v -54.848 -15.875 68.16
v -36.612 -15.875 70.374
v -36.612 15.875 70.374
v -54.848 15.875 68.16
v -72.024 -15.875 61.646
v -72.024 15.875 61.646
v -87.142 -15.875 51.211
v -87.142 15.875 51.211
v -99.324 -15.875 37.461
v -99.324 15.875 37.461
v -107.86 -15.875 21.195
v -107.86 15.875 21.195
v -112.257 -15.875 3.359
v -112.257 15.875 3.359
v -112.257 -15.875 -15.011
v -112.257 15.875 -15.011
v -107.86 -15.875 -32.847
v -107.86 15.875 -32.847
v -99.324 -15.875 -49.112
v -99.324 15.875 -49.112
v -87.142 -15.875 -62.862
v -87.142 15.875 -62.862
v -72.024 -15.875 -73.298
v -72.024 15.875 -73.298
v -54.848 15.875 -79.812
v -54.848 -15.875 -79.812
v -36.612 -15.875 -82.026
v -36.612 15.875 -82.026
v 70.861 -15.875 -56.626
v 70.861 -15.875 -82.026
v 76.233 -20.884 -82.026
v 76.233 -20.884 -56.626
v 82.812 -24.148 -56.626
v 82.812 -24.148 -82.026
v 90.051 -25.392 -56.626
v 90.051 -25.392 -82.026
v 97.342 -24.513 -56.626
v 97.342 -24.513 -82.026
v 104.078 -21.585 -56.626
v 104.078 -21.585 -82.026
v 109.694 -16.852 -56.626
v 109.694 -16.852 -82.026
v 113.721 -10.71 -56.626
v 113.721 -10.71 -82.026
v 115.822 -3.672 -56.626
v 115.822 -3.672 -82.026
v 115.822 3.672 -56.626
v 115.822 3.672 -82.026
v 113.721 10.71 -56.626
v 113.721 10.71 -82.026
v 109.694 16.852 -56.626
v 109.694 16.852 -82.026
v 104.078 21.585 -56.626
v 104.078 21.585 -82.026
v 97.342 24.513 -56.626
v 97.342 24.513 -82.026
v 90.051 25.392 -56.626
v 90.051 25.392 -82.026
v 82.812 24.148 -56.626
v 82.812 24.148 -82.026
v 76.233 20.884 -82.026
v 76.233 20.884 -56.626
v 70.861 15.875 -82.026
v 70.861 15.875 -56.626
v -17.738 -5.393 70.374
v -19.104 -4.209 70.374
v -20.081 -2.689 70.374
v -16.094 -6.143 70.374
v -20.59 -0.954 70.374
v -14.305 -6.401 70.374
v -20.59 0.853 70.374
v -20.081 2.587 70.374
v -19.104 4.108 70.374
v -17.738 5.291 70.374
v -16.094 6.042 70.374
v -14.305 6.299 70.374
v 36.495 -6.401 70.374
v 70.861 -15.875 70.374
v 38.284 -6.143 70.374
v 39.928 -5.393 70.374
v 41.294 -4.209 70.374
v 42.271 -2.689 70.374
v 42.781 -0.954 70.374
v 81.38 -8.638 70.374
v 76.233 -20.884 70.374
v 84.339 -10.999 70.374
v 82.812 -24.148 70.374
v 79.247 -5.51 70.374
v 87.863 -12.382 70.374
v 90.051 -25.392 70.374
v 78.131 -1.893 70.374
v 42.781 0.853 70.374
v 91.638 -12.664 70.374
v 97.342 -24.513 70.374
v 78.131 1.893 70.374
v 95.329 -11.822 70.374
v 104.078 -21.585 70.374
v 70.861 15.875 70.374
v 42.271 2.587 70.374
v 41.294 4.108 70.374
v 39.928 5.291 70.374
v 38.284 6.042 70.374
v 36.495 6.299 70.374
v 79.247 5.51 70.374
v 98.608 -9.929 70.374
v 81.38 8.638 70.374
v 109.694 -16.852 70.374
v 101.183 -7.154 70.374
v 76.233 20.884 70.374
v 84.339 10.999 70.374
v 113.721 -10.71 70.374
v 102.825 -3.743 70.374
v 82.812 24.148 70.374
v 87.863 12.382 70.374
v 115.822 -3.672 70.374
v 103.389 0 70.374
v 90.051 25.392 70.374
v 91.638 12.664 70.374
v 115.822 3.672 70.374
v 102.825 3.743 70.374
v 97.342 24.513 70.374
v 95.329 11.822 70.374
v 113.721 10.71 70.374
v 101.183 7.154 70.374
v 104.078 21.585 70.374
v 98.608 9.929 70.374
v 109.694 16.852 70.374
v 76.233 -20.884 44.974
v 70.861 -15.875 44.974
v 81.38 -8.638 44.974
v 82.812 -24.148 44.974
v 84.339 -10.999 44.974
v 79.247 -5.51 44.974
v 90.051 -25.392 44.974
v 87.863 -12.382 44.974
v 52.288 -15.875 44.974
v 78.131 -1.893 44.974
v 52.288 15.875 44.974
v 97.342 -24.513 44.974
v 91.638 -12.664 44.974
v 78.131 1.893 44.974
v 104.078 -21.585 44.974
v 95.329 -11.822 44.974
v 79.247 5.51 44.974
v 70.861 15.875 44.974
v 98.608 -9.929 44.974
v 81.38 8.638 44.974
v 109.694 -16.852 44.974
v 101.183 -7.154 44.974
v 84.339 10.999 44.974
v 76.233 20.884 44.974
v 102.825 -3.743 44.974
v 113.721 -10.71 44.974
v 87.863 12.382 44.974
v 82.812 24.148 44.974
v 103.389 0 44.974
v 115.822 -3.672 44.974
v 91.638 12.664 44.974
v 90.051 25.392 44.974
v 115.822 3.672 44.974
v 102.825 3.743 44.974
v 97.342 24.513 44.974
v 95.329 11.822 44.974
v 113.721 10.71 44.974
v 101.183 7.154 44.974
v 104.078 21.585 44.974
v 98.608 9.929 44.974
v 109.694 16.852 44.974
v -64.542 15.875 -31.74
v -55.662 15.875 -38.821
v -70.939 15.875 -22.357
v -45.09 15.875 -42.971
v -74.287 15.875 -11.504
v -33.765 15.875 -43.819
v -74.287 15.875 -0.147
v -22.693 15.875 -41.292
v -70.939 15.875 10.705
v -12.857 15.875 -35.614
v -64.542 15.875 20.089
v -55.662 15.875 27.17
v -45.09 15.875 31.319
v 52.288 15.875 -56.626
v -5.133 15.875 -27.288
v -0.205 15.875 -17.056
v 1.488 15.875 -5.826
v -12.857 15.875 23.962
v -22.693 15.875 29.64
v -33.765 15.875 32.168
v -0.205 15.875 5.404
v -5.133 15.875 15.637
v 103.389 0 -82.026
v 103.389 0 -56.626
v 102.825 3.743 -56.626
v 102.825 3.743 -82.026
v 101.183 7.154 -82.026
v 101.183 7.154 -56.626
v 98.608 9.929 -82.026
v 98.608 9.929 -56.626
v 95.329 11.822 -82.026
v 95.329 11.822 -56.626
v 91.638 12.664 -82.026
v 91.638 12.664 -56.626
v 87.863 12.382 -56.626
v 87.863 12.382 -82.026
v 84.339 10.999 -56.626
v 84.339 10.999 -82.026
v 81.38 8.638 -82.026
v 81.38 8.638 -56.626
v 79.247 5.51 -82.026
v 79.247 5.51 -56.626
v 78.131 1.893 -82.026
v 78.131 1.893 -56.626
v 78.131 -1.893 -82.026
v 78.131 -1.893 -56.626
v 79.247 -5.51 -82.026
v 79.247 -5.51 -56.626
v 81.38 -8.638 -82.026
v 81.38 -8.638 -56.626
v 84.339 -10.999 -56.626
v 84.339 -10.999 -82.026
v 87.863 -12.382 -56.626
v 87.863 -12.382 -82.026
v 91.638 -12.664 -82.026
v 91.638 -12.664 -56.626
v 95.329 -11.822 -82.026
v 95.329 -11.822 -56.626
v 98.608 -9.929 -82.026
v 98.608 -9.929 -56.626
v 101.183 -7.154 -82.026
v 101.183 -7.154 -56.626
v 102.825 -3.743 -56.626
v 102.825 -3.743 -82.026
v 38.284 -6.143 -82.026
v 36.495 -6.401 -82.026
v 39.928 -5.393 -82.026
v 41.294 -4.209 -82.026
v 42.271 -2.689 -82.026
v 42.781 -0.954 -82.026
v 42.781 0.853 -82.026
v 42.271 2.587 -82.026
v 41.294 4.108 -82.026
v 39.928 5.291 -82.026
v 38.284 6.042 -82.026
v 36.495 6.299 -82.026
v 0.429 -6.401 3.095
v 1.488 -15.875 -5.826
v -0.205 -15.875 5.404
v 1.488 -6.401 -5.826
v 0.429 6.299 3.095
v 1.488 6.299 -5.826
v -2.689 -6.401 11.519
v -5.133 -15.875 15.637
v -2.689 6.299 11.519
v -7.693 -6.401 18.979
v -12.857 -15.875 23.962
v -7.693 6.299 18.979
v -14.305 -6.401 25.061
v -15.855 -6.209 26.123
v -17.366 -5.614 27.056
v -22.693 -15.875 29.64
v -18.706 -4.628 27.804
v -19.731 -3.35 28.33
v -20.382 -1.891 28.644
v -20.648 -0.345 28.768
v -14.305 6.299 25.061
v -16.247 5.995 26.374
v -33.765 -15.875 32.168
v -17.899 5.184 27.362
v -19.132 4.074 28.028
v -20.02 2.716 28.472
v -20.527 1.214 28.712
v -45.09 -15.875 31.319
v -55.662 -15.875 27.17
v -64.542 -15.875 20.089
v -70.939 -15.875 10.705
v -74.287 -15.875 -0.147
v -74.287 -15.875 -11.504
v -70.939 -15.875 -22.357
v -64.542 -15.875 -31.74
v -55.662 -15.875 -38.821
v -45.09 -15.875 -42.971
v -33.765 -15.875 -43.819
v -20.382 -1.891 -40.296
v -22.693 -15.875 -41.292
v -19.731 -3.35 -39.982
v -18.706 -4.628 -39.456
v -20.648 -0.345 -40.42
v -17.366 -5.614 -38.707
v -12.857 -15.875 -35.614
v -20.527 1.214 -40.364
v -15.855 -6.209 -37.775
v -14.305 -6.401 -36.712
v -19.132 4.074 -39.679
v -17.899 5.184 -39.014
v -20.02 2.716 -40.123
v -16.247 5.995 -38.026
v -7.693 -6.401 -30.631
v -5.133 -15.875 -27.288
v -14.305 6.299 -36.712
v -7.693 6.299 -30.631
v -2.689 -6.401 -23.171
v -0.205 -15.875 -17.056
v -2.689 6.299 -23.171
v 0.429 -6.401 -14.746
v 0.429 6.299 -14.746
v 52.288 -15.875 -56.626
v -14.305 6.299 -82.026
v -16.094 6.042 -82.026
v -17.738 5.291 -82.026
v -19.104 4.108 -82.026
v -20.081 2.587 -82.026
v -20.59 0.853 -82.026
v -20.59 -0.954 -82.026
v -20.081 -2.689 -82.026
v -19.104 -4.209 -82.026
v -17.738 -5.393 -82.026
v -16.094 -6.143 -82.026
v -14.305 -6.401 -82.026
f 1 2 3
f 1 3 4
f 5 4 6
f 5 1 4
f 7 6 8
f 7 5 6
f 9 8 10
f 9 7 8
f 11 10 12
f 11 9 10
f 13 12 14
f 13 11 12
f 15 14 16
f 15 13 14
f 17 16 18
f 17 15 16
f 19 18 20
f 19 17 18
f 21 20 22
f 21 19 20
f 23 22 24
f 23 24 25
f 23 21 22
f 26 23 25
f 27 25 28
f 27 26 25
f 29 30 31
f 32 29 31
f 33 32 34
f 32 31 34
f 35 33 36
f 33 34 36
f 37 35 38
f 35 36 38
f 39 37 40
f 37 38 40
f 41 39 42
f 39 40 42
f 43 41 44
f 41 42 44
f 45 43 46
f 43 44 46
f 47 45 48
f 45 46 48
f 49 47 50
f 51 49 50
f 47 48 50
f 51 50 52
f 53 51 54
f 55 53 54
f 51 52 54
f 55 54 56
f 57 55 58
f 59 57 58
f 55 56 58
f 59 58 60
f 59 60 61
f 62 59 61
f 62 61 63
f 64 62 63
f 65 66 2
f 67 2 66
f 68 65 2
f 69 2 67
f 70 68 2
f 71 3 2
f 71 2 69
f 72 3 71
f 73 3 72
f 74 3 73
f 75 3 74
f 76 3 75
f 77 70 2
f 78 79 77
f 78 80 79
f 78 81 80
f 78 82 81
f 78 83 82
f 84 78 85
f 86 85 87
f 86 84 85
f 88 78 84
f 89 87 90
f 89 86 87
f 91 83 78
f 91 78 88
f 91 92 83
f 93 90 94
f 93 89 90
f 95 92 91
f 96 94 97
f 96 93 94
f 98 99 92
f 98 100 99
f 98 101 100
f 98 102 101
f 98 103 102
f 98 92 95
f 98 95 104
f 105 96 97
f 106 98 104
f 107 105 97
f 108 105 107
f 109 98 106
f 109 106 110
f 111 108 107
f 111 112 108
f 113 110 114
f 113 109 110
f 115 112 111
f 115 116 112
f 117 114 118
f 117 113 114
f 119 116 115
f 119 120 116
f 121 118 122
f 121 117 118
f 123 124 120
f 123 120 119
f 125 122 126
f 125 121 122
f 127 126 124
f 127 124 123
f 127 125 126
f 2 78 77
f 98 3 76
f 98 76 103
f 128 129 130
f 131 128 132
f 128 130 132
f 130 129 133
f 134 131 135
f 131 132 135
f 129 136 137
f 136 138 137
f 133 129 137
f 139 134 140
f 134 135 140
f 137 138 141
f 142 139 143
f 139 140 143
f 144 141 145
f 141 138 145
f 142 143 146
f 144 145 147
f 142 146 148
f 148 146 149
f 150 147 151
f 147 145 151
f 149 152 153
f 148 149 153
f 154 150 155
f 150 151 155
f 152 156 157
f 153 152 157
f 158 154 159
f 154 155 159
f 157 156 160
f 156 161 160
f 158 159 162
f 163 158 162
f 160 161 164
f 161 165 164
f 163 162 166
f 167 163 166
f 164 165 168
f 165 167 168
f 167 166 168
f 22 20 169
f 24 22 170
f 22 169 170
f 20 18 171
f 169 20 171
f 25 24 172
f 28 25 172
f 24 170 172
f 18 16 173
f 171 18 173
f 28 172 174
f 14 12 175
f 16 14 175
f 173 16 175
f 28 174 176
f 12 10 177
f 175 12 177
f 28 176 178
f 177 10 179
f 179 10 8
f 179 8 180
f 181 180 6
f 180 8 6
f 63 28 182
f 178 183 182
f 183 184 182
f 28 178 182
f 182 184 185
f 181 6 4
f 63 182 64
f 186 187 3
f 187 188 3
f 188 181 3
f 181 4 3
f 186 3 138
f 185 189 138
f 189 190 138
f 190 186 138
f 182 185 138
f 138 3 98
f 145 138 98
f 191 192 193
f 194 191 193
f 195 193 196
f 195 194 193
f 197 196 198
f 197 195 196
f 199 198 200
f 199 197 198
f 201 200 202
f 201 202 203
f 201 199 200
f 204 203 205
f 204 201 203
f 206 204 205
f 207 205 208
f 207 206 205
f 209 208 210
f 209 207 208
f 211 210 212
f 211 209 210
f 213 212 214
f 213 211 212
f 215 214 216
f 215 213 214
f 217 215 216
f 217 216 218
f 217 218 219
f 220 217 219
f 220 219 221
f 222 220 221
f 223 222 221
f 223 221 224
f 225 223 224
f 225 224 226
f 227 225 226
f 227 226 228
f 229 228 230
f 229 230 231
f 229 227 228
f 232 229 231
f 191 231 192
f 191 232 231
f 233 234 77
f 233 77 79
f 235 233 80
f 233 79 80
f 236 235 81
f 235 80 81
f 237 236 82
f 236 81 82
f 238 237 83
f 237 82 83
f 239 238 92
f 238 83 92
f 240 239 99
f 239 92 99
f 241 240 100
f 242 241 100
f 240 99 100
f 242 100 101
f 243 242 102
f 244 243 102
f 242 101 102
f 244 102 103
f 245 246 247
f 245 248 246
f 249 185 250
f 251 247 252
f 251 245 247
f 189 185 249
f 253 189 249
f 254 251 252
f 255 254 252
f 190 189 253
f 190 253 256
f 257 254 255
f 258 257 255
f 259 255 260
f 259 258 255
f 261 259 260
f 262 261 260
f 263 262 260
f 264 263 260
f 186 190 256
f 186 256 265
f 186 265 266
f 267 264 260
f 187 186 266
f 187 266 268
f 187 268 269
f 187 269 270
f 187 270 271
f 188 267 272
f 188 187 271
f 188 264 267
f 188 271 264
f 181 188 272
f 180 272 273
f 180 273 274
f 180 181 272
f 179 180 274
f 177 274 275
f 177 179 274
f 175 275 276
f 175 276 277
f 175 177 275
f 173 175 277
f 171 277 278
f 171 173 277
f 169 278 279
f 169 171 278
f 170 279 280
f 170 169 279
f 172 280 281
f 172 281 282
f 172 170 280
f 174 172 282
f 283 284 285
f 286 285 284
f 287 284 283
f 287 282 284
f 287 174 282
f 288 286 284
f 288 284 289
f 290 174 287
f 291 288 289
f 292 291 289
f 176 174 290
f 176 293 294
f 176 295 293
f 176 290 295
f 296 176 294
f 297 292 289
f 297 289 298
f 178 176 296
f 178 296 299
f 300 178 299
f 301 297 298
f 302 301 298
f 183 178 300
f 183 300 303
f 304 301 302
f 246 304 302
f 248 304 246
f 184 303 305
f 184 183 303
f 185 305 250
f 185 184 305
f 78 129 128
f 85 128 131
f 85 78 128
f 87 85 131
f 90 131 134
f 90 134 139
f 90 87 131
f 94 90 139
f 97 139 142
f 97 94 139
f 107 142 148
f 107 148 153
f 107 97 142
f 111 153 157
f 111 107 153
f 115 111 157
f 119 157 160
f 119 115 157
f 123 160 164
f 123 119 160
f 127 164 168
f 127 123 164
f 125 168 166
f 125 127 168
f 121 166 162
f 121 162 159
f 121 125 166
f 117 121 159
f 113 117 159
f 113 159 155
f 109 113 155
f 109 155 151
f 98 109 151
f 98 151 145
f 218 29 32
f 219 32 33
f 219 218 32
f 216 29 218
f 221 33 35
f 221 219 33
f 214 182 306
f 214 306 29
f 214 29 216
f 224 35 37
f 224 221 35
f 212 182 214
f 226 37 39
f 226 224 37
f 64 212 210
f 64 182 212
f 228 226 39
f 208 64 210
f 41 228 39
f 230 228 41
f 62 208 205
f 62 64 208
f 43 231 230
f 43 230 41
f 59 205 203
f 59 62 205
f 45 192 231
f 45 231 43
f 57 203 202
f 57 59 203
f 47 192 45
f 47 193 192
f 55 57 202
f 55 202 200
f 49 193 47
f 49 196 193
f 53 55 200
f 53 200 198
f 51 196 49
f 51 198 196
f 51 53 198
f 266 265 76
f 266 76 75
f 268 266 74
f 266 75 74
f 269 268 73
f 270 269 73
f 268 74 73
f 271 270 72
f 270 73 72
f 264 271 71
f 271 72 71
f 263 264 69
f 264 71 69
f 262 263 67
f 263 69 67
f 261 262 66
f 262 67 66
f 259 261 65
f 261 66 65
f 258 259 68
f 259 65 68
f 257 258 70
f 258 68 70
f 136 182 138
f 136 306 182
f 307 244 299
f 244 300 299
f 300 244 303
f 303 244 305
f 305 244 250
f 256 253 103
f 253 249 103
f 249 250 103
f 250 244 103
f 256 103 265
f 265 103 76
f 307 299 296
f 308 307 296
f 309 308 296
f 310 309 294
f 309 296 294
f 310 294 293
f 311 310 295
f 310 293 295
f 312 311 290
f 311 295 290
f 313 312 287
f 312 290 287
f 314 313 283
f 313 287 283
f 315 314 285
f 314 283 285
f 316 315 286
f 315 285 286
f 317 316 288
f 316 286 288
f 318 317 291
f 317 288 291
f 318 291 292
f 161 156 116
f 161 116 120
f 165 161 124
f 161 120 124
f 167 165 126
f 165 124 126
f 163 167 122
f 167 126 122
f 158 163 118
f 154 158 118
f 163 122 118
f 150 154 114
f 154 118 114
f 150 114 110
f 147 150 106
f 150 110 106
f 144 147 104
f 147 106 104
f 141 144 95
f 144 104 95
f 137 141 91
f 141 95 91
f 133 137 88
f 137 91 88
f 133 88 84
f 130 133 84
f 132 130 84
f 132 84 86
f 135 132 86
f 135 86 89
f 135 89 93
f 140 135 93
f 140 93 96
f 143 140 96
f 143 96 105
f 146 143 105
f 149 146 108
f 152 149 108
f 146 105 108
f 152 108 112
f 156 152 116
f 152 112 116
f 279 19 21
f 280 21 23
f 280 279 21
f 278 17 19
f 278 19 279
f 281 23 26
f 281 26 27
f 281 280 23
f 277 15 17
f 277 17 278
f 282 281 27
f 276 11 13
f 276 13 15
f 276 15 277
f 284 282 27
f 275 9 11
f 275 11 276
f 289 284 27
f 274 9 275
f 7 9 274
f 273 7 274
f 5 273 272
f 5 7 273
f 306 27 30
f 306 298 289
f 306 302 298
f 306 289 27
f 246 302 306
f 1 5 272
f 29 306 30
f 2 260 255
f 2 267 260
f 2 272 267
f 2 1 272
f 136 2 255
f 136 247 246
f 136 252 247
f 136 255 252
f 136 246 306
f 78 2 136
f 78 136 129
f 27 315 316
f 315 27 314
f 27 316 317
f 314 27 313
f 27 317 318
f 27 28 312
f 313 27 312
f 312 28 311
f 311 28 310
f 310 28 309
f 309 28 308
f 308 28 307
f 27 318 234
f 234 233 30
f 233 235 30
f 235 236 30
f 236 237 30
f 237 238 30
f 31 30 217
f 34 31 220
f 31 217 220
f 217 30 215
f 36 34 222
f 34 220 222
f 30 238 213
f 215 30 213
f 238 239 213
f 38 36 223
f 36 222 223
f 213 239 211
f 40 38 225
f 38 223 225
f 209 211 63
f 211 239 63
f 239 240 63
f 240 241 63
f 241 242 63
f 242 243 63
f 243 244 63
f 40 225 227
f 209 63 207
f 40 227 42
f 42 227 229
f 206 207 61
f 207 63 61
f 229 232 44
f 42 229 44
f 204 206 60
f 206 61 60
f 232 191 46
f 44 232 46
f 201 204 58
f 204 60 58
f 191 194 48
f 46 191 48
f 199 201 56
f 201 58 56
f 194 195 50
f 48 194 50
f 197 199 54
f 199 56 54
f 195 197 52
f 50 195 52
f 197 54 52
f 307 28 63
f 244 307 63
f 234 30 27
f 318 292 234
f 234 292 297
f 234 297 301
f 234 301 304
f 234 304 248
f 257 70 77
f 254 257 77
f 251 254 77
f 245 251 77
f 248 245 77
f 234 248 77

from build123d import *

# Parameters (mm, degrees)
F0_R     = 38.1
F1_DEPTH = 15.875
F3_DEPTH = 152.4
F4_R     = 12.7
F5_DEPTH = 25.4


# Not quite as in the source:
# - a feature names something its author has since deleted; it is built from what else it names


with BuildPart() as f1:
    # F0 (on Front) → F1 (new body, symmetric)
    with BuildSketch(Plane.XZ):
        with BuildLine():
            Line((70.8614879427, 70.3741200164), (-36.6122665732, 70.3741200164))
            ThreePointArc((-36.6122665732, 70.3741200164), (-112.8122614121, -5.8258799836), (-36.6122665732, -82.0258799836))
            Line((-36.6122665732, -82.0258799836), (70.8614879427, -82.0258799836))
            Line((70.8614879427, -82.0258799836), (70.8614879427, -56.6258799836))
            Line((70.8614879427, -56.6258799836), (52.2877385879, -56.6258799836))
            Line((52.2877385879, -56.6258799836), (52.2877385879, 44.9741200164))
            Line((52.2877385879, 44.9741200164), (70.8614879427, 44.9741200164))
            Line((70.8614879427, 44.9741200164), (70.8614879427, 70.3741200164))
        make_face()
        with Locations((-36.6122614121, -5.8258799836)):
            Circle(F0_R, mode=Mode.SUBTRACT)
    extrude(amount=F1_DEPTH, both=True)

    # F2 (on face) → F3 (cut)
    with BuildSketch(Plane.XY.offset(70.3741200164)):
        with BuildLine():
            Line((36.4952879427, 6.2992834322), (-14.3047120573, 6.2992834322))
            ThreePointArc((-14.3047120573, 6.2992834322), (-20.6547120573, -0.0507165678), (-14.3047120573, -6.4007165678))
            Line((-14.3047120573, -6.4007165678), (36.4952879427, -6.4007165678))
            ThreePointArc((36.4952879427, -6.4007165678), (42.8452879427, -0.0507165678), (36.4952879427, 6.2992834322))
        make_face()
    extrude(amount=-F3_DEPTH, mode=Mode.SUBTRACT)

    # F4 (on face) → F5 (join)
    with BuildSketch(Plane.XY.offset(70.3741200164)):
        with BuildLine():
            Line((70.8614879427, 15.875), (70.8614879427, -15.875))
            ThreePointArc((70.8614879427, -15.875), (116.0893565876, 0), (70.8614879427, 15.875))
        make_face()
        with Locations((90.6893565876, 0)):
            Circle(F4_R, mode=Mode.SUBTRACT)
    extrude(amount=-F5_DEPTH)

    # F7: F1 across plane


with BuildPart() as f1_1:
    add(f1.part)
    add(f1.part.mirror(Plane(origin=(52.2877385879, -15.875, -5.8258799836), x_dir=(1, 0, 0), z_dir=(0, 0, -1))))


solid = f1_1.part
